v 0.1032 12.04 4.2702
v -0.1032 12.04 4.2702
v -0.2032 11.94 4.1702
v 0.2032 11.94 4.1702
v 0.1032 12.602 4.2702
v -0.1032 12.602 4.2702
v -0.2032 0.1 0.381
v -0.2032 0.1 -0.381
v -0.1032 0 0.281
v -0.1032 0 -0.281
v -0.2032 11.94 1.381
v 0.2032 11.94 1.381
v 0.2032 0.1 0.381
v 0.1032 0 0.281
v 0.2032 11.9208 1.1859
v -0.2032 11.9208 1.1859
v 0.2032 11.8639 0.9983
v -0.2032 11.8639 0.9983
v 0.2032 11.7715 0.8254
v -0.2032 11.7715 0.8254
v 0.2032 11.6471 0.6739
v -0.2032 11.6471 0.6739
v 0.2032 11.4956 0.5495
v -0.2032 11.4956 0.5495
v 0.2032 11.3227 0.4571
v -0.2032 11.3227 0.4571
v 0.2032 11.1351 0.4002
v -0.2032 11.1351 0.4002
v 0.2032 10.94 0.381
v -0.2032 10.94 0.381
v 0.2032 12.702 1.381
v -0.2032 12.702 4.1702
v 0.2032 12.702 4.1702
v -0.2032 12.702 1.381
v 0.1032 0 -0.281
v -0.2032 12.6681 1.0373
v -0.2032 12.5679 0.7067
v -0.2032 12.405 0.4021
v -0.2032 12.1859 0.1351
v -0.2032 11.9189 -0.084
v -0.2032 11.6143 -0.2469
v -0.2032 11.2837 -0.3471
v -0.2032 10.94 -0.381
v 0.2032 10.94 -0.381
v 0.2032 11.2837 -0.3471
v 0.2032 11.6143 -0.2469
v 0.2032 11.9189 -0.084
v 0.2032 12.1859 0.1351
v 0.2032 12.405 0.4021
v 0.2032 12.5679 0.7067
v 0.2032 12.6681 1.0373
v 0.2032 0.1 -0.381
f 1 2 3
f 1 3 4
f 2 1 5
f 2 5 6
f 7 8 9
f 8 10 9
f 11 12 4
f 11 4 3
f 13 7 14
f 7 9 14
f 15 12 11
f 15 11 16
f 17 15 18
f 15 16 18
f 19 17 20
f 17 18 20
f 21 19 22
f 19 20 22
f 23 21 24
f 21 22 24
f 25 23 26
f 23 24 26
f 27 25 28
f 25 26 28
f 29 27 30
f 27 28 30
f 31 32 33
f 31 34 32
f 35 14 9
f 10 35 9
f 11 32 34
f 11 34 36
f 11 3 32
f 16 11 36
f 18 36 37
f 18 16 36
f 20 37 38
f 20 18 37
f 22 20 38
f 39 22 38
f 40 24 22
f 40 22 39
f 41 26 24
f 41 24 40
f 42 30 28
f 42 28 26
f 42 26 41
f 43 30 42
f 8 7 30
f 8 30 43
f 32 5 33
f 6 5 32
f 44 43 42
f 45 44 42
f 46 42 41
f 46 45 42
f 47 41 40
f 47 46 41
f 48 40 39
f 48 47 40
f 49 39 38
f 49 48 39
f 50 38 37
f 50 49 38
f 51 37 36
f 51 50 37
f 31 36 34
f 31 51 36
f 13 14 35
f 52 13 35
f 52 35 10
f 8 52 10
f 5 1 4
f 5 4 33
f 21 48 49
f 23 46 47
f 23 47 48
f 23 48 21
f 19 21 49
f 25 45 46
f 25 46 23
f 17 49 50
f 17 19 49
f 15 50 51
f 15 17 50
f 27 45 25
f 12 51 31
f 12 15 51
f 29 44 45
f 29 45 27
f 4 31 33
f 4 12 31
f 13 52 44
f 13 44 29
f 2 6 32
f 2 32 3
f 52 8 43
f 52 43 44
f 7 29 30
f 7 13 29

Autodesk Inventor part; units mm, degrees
ref_plane "YZ Plane" through (0, 0, 0) normal (1, 0, 0) x (0, 1, 0)
ref_plane "XZ Plane" through (0, 0, 0) normal (0, 1, 0) x (-1, 0, 0)
ref_plane "XY Plane" through (0, 0, 0) normal (0, 0, 1) x (1, 0, 0)
sketch "Sketch1" plane through (0, 0, 0) normal (0, 1, 0) x (-1, 0, 0)
  line L0 (0.2032, -0.381) -> (-0.2032, -0.381)
  line L1 (-0.2032, -0.381) -> (-0.2032, 0.381)
  line L2 (-0.2032, 0.381) -> (0.2032, 0.381)
  line L3 (0.2032, 0.381) -> (0.2032, -0.381)
  line L4 (0.2032, -0.381) -> (-0.2032, 0.381) construction
  line L5 (-0.2032, -0.381) -> (0.2032, 0.381) construction
  point P0 (0, 0)
  dimension "d0" = 0.4064
  dimension "d1" = 0.762
extrude "Extrusion1" add sketch "Sketch1" along normal blind 15.4
chamfer "Chamfer1" distance 0.1 angle 45 8 edges at (0.2032, 15.4, 0) (0, 15.4, -0.381) (0, 15.4, 0.381) (-0.2032, 15.4, 0) (0.2032, 0, 0) (0, 0, -0.381) (0, 0, 0.381) (-0.2032, 0, 0)
sketch "Sketch2" plane through (-0.2032, 0.1, 0.381) normal (0, 0, 1) x (1, 0, 0)
  line L0 (-1.0405, 10.84) -> (1.7368, 10.84)
  point P0 (0.2032, -0.1)
  dimension "d7" = 10.94
bend part "Bend Part1" radius 1 angle 90 line through (-1.2437, 10.94, 0.381) along (1, 0, 0) centre toward (0, 0, 1) moving side (0, 1, 0) both sides no
properties part number "PinRight2" material "Gold"
